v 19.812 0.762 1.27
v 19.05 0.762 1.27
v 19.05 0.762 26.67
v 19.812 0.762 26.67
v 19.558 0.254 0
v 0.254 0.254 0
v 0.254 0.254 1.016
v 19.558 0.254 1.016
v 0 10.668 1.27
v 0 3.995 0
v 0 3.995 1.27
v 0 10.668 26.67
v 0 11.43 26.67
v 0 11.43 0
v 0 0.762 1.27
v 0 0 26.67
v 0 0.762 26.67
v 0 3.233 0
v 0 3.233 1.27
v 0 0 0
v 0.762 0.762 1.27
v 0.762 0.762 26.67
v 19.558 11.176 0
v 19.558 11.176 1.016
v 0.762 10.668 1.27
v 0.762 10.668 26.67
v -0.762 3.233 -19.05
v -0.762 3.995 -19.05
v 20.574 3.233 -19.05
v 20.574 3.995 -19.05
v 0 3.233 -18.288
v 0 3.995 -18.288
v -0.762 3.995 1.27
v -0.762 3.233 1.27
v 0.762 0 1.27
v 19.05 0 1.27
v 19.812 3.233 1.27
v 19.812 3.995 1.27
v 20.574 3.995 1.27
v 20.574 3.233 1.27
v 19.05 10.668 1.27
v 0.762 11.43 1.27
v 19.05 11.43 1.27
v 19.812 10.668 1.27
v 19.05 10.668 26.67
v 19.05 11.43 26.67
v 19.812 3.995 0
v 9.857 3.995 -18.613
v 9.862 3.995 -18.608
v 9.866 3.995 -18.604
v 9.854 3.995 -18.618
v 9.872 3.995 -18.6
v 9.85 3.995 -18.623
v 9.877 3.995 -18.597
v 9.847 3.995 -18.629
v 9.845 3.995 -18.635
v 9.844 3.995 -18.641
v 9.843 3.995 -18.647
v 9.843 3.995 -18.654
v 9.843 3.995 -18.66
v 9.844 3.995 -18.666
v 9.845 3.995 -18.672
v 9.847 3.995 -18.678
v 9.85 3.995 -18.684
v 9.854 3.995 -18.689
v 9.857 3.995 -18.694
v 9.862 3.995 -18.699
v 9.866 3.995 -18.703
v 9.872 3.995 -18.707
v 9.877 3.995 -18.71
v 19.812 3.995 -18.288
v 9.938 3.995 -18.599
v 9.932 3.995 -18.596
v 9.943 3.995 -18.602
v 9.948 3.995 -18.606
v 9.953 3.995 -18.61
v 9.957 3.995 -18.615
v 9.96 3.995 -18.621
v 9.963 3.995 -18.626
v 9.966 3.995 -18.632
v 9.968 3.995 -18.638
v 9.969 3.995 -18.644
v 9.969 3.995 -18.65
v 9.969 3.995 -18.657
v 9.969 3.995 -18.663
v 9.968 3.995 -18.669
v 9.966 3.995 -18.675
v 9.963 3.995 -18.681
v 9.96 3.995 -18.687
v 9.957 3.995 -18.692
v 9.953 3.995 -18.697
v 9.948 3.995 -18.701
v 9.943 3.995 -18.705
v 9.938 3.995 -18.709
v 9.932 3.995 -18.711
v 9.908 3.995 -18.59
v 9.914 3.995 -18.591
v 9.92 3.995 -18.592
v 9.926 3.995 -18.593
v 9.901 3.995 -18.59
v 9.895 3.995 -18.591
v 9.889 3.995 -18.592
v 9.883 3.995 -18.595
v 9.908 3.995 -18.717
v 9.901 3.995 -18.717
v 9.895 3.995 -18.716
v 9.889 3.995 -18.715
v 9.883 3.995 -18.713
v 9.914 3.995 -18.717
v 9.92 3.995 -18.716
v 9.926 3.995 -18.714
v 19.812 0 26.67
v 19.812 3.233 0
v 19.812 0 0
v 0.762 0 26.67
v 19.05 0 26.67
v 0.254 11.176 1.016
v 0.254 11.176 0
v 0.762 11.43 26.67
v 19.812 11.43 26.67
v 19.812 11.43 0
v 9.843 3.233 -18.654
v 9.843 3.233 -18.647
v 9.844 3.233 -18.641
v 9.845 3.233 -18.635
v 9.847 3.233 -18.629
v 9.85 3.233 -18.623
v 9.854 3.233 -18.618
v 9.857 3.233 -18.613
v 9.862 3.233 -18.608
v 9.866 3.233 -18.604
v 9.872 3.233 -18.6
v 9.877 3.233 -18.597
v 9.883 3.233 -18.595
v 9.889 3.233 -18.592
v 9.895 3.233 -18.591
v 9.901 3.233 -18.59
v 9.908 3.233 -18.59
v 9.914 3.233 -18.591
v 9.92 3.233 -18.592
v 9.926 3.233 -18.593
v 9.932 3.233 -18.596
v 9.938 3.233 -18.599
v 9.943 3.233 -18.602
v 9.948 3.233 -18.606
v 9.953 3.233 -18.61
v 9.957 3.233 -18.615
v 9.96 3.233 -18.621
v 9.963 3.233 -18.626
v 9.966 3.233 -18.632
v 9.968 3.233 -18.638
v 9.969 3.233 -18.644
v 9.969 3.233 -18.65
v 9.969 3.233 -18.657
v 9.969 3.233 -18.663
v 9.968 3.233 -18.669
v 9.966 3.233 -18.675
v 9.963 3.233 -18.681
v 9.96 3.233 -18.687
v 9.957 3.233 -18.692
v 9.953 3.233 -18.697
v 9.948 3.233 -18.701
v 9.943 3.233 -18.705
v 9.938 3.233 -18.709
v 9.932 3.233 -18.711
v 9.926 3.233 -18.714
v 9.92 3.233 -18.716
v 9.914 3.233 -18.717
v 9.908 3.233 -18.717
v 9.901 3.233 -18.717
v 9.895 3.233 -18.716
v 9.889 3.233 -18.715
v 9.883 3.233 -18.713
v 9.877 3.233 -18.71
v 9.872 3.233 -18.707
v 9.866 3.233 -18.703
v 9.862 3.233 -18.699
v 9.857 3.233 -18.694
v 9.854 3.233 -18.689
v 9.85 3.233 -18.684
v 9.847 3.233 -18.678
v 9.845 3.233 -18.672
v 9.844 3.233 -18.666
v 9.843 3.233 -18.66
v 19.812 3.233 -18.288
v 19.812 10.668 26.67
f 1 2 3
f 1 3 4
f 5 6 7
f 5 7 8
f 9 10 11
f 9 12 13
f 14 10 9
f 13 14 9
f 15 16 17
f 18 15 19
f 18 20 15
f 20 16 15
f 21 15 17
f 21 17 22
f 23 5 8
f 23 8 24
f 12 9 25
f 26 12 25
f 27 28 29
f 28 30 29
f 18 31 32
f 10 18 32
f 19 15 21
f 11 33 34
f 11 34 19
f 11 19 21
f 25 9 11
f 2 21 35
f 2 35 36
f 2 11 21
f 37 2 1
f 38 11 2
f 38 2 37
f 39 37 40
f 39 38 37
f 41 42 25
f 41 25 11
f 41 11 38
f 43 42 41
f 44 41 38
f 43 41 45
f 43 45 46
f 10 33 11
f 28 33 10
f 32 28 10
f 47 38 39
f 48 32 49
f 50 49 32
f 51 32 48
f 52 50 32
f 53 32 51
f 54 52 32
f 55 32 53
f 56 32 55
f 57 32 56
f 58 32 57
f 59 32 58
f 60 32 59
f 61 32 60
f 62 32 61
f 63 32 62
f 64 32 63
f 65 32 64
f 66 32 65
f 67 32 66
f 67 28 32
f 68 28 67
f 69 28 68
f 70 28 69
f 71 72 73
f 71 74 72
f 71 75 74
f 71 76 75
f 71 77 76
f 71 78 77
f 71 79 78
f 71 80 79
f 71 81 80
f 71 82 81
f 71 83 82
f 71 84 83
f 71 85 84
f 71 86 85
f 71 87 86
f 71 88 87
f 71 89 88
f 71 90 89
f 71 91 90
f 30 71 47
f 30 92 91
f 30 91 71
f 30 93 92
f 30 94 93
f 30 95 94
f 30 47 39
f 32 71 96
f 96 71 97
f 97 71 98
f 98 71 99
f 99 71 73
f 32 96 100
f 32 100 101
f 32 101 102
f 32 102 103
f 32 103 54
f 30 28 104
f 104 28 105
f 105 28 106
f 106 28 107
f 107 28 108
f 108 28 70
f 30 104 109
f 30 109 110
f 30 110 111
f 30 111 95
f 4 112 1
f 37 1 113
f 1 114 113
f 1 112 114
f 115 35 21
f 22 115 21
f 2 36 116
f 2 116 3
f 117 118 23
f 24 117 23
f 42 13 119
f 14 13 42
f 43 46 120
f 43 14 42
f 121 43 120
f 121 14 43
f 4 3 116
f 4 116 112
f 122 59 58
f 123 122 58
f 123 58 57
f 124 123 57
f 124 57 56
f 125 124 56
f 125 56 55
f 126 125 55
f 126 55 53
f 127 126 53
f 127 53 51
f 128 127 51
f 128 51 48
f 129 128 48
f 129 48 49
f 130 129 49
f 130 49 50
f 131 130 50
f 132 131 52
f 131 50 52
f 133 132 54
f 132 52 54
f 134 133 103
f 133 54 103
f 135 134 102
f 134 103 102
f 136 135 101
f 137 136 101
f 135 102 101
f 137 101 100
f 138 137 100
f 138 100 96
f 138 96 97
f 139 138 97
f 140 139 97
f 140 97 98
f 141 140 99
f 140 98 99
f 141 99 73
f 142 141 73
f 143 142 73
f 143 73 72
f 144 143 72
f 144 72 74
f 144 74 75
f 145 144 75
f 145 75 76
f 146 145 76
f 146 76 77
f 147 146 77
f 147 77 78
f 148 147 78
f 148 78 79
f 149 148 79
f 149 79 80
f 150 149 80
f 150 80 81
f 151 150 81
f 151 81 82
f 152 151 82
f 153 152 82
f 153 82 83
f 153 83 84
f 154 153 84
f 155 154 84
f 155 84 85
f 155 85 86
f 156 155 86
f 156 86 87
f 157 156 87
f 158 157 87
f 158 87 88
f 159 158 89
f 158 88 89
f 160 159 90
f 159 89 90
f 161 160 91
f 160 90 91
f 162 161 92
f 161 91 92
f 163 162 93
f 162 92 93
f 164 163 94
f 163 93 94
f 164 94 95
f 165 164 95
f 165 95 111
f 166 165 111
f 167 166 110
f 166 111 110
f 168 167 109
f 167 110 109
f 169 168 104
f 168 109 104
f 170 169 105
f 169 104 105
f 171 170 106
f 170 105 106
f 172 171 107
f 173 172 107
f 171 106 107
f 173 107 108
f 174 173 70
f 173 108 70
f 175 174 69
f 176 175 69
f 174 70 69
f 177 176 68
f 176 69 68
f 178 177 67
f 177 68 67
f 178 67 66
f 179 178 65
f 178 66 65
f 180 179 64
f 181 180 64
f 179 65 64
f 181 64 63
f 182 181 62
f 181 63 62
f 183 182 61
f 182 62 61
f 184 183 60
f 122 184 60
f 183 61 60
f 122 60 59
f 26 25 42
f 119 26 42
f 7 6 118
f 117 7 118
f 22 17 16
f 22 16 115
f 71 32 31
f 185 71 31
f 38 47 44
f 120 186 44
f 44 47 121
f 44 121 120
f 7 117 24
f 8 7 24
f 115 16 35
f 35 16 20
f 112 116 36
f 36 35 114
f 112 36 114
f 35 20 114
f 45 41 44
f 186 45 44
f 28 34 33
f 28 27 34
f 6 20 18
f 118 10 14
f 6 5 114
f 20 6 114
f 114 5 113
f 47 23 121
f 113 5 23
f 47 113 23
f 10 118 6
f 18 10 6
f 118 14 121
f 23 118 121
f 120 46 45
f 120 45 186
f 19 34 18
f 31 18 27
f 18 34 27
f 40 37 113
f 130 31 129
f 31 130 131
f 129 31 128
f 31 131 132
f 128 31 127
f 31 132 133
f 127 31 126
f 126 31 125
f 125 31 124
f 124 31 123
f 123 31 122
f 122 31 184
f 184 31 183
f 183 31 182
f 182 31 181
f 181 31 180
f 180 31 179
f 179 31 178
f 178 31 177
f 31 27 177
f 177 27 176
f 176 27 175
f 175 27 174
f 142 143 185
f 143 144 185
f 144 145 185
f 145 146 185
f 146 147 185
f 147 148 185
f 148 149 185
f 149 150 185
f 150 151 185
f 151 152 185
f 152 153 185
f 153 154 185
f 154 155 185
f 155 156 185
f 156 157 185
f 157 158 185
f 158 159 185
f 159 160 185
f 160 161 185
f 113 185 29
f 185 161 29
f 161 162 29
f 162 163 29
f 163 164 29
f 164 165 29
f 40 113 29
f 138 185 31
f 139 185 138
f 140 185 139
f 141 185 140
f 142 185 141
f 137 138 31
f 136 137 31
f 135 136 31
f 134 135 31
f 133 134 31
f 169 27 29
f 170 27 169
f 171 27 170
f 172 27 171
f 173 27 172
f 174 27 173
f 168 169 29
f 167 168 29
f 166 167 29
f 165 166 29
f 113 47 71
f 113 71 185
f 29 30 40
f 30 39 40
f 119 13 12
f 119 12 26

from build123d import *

# Parameters (mm, degrees)
F0_W      = 19.812
F0_H      = 11.43
F1_DEPTH  = 1.27
F2_T      = -0.254
F3_W      = 0.762
F3_H      = 0.762
F4_DEPTH  = 25.4
F5_W      = 0.762
F5_H      = 1.27
F6_DEPTH  = 0.762
F7_W      = 0.762
F7_H      = 0.762
F8_DEPTH  = 19.05
F9_W      = 0.762
F9_H      = 0.762
F10_DEPTH = 20.574
F11_W     = 0.762
F11_H     = 0.762
F12_DEPTH = 19.558
F14_D     = 0.127


with BuildPart() as f1:
    # F0 (on Top) → F1 (new body)
    with BuildSketch(Plane.XY):
        with Locations((9.906, 5.715)):
            Rectangle(F0_W, F0_H)
    extrude(amount=F1_DEPTH)

    # F2
    f2_openings = [f1.faces().sort_by_distance(p)[0] for p in [
        (9.906, 5.715, 0),
    ]]
    offset(amount=F2_T, openings=f2_openings)

    # F3 (on face) → F4 (join)
    with BuildSketch(Plane.XY.offset(1.27)):
        with Locations((19.431, 0.381)):
            Rectangle(F3_W, F3_H)
        with Locations((19.431, 11.049)):
            Rectangle(F3_W, F3_H)
        with Locations((0.381, 11.049)):
            Rectangle(F3_W, F3_H)
        with Locations((0.381, 0.381)):
            Rectangle(F3_W, F3_H)
    extrude(amount=F4_DEPTH)

    # F5 (on face) → F6 (join)
    with BuildSketch(Plane.YZ.offset(19.812)):
        with Locations((3.614489, 0.635)):
            Rectangle(F5_W, F5_H)
    extrude(amount=F6_DEPTH)

    # F7 (on face) → F8 (join)
    with BuildSketch(Plane(origin=(0, 0, 0), x_dir=(1, 0, 0), z_dir=(0, 0, -1))):
        with Locations((20.193, -3.614489)):
            Rectangle(F7_W, F7_H)
    extrude(amount=F8_DEPTH)

    # F9 (on face) → F10 (join)
    with BuildSketch(Plane(origin=(19.812, 0, 0), x_dir=(0, -1, 0), z_dir=(-1, 0, 0))):
        with Locations((-3.614489, -18.669)):
            Rectangle(F9_W, F9_H)
    extrude(amount=F10_DEPTH)

    # F11 (on face) → F12 (join)
    with BuildSketch(Plane.XY.offset(-18.288)):
        with Locations((-0.381, 3.614489)):
            Rectangle(F11_W, F11_H)
    extrude(amount=F12_DEPTH)

    # F14 (through all)
    with Locations(Plane.XZ.offset(-3.233489)):
        with Locations((9.906, -18.653618)):
            Hole(F14_D / 2)


solid = f1.part
